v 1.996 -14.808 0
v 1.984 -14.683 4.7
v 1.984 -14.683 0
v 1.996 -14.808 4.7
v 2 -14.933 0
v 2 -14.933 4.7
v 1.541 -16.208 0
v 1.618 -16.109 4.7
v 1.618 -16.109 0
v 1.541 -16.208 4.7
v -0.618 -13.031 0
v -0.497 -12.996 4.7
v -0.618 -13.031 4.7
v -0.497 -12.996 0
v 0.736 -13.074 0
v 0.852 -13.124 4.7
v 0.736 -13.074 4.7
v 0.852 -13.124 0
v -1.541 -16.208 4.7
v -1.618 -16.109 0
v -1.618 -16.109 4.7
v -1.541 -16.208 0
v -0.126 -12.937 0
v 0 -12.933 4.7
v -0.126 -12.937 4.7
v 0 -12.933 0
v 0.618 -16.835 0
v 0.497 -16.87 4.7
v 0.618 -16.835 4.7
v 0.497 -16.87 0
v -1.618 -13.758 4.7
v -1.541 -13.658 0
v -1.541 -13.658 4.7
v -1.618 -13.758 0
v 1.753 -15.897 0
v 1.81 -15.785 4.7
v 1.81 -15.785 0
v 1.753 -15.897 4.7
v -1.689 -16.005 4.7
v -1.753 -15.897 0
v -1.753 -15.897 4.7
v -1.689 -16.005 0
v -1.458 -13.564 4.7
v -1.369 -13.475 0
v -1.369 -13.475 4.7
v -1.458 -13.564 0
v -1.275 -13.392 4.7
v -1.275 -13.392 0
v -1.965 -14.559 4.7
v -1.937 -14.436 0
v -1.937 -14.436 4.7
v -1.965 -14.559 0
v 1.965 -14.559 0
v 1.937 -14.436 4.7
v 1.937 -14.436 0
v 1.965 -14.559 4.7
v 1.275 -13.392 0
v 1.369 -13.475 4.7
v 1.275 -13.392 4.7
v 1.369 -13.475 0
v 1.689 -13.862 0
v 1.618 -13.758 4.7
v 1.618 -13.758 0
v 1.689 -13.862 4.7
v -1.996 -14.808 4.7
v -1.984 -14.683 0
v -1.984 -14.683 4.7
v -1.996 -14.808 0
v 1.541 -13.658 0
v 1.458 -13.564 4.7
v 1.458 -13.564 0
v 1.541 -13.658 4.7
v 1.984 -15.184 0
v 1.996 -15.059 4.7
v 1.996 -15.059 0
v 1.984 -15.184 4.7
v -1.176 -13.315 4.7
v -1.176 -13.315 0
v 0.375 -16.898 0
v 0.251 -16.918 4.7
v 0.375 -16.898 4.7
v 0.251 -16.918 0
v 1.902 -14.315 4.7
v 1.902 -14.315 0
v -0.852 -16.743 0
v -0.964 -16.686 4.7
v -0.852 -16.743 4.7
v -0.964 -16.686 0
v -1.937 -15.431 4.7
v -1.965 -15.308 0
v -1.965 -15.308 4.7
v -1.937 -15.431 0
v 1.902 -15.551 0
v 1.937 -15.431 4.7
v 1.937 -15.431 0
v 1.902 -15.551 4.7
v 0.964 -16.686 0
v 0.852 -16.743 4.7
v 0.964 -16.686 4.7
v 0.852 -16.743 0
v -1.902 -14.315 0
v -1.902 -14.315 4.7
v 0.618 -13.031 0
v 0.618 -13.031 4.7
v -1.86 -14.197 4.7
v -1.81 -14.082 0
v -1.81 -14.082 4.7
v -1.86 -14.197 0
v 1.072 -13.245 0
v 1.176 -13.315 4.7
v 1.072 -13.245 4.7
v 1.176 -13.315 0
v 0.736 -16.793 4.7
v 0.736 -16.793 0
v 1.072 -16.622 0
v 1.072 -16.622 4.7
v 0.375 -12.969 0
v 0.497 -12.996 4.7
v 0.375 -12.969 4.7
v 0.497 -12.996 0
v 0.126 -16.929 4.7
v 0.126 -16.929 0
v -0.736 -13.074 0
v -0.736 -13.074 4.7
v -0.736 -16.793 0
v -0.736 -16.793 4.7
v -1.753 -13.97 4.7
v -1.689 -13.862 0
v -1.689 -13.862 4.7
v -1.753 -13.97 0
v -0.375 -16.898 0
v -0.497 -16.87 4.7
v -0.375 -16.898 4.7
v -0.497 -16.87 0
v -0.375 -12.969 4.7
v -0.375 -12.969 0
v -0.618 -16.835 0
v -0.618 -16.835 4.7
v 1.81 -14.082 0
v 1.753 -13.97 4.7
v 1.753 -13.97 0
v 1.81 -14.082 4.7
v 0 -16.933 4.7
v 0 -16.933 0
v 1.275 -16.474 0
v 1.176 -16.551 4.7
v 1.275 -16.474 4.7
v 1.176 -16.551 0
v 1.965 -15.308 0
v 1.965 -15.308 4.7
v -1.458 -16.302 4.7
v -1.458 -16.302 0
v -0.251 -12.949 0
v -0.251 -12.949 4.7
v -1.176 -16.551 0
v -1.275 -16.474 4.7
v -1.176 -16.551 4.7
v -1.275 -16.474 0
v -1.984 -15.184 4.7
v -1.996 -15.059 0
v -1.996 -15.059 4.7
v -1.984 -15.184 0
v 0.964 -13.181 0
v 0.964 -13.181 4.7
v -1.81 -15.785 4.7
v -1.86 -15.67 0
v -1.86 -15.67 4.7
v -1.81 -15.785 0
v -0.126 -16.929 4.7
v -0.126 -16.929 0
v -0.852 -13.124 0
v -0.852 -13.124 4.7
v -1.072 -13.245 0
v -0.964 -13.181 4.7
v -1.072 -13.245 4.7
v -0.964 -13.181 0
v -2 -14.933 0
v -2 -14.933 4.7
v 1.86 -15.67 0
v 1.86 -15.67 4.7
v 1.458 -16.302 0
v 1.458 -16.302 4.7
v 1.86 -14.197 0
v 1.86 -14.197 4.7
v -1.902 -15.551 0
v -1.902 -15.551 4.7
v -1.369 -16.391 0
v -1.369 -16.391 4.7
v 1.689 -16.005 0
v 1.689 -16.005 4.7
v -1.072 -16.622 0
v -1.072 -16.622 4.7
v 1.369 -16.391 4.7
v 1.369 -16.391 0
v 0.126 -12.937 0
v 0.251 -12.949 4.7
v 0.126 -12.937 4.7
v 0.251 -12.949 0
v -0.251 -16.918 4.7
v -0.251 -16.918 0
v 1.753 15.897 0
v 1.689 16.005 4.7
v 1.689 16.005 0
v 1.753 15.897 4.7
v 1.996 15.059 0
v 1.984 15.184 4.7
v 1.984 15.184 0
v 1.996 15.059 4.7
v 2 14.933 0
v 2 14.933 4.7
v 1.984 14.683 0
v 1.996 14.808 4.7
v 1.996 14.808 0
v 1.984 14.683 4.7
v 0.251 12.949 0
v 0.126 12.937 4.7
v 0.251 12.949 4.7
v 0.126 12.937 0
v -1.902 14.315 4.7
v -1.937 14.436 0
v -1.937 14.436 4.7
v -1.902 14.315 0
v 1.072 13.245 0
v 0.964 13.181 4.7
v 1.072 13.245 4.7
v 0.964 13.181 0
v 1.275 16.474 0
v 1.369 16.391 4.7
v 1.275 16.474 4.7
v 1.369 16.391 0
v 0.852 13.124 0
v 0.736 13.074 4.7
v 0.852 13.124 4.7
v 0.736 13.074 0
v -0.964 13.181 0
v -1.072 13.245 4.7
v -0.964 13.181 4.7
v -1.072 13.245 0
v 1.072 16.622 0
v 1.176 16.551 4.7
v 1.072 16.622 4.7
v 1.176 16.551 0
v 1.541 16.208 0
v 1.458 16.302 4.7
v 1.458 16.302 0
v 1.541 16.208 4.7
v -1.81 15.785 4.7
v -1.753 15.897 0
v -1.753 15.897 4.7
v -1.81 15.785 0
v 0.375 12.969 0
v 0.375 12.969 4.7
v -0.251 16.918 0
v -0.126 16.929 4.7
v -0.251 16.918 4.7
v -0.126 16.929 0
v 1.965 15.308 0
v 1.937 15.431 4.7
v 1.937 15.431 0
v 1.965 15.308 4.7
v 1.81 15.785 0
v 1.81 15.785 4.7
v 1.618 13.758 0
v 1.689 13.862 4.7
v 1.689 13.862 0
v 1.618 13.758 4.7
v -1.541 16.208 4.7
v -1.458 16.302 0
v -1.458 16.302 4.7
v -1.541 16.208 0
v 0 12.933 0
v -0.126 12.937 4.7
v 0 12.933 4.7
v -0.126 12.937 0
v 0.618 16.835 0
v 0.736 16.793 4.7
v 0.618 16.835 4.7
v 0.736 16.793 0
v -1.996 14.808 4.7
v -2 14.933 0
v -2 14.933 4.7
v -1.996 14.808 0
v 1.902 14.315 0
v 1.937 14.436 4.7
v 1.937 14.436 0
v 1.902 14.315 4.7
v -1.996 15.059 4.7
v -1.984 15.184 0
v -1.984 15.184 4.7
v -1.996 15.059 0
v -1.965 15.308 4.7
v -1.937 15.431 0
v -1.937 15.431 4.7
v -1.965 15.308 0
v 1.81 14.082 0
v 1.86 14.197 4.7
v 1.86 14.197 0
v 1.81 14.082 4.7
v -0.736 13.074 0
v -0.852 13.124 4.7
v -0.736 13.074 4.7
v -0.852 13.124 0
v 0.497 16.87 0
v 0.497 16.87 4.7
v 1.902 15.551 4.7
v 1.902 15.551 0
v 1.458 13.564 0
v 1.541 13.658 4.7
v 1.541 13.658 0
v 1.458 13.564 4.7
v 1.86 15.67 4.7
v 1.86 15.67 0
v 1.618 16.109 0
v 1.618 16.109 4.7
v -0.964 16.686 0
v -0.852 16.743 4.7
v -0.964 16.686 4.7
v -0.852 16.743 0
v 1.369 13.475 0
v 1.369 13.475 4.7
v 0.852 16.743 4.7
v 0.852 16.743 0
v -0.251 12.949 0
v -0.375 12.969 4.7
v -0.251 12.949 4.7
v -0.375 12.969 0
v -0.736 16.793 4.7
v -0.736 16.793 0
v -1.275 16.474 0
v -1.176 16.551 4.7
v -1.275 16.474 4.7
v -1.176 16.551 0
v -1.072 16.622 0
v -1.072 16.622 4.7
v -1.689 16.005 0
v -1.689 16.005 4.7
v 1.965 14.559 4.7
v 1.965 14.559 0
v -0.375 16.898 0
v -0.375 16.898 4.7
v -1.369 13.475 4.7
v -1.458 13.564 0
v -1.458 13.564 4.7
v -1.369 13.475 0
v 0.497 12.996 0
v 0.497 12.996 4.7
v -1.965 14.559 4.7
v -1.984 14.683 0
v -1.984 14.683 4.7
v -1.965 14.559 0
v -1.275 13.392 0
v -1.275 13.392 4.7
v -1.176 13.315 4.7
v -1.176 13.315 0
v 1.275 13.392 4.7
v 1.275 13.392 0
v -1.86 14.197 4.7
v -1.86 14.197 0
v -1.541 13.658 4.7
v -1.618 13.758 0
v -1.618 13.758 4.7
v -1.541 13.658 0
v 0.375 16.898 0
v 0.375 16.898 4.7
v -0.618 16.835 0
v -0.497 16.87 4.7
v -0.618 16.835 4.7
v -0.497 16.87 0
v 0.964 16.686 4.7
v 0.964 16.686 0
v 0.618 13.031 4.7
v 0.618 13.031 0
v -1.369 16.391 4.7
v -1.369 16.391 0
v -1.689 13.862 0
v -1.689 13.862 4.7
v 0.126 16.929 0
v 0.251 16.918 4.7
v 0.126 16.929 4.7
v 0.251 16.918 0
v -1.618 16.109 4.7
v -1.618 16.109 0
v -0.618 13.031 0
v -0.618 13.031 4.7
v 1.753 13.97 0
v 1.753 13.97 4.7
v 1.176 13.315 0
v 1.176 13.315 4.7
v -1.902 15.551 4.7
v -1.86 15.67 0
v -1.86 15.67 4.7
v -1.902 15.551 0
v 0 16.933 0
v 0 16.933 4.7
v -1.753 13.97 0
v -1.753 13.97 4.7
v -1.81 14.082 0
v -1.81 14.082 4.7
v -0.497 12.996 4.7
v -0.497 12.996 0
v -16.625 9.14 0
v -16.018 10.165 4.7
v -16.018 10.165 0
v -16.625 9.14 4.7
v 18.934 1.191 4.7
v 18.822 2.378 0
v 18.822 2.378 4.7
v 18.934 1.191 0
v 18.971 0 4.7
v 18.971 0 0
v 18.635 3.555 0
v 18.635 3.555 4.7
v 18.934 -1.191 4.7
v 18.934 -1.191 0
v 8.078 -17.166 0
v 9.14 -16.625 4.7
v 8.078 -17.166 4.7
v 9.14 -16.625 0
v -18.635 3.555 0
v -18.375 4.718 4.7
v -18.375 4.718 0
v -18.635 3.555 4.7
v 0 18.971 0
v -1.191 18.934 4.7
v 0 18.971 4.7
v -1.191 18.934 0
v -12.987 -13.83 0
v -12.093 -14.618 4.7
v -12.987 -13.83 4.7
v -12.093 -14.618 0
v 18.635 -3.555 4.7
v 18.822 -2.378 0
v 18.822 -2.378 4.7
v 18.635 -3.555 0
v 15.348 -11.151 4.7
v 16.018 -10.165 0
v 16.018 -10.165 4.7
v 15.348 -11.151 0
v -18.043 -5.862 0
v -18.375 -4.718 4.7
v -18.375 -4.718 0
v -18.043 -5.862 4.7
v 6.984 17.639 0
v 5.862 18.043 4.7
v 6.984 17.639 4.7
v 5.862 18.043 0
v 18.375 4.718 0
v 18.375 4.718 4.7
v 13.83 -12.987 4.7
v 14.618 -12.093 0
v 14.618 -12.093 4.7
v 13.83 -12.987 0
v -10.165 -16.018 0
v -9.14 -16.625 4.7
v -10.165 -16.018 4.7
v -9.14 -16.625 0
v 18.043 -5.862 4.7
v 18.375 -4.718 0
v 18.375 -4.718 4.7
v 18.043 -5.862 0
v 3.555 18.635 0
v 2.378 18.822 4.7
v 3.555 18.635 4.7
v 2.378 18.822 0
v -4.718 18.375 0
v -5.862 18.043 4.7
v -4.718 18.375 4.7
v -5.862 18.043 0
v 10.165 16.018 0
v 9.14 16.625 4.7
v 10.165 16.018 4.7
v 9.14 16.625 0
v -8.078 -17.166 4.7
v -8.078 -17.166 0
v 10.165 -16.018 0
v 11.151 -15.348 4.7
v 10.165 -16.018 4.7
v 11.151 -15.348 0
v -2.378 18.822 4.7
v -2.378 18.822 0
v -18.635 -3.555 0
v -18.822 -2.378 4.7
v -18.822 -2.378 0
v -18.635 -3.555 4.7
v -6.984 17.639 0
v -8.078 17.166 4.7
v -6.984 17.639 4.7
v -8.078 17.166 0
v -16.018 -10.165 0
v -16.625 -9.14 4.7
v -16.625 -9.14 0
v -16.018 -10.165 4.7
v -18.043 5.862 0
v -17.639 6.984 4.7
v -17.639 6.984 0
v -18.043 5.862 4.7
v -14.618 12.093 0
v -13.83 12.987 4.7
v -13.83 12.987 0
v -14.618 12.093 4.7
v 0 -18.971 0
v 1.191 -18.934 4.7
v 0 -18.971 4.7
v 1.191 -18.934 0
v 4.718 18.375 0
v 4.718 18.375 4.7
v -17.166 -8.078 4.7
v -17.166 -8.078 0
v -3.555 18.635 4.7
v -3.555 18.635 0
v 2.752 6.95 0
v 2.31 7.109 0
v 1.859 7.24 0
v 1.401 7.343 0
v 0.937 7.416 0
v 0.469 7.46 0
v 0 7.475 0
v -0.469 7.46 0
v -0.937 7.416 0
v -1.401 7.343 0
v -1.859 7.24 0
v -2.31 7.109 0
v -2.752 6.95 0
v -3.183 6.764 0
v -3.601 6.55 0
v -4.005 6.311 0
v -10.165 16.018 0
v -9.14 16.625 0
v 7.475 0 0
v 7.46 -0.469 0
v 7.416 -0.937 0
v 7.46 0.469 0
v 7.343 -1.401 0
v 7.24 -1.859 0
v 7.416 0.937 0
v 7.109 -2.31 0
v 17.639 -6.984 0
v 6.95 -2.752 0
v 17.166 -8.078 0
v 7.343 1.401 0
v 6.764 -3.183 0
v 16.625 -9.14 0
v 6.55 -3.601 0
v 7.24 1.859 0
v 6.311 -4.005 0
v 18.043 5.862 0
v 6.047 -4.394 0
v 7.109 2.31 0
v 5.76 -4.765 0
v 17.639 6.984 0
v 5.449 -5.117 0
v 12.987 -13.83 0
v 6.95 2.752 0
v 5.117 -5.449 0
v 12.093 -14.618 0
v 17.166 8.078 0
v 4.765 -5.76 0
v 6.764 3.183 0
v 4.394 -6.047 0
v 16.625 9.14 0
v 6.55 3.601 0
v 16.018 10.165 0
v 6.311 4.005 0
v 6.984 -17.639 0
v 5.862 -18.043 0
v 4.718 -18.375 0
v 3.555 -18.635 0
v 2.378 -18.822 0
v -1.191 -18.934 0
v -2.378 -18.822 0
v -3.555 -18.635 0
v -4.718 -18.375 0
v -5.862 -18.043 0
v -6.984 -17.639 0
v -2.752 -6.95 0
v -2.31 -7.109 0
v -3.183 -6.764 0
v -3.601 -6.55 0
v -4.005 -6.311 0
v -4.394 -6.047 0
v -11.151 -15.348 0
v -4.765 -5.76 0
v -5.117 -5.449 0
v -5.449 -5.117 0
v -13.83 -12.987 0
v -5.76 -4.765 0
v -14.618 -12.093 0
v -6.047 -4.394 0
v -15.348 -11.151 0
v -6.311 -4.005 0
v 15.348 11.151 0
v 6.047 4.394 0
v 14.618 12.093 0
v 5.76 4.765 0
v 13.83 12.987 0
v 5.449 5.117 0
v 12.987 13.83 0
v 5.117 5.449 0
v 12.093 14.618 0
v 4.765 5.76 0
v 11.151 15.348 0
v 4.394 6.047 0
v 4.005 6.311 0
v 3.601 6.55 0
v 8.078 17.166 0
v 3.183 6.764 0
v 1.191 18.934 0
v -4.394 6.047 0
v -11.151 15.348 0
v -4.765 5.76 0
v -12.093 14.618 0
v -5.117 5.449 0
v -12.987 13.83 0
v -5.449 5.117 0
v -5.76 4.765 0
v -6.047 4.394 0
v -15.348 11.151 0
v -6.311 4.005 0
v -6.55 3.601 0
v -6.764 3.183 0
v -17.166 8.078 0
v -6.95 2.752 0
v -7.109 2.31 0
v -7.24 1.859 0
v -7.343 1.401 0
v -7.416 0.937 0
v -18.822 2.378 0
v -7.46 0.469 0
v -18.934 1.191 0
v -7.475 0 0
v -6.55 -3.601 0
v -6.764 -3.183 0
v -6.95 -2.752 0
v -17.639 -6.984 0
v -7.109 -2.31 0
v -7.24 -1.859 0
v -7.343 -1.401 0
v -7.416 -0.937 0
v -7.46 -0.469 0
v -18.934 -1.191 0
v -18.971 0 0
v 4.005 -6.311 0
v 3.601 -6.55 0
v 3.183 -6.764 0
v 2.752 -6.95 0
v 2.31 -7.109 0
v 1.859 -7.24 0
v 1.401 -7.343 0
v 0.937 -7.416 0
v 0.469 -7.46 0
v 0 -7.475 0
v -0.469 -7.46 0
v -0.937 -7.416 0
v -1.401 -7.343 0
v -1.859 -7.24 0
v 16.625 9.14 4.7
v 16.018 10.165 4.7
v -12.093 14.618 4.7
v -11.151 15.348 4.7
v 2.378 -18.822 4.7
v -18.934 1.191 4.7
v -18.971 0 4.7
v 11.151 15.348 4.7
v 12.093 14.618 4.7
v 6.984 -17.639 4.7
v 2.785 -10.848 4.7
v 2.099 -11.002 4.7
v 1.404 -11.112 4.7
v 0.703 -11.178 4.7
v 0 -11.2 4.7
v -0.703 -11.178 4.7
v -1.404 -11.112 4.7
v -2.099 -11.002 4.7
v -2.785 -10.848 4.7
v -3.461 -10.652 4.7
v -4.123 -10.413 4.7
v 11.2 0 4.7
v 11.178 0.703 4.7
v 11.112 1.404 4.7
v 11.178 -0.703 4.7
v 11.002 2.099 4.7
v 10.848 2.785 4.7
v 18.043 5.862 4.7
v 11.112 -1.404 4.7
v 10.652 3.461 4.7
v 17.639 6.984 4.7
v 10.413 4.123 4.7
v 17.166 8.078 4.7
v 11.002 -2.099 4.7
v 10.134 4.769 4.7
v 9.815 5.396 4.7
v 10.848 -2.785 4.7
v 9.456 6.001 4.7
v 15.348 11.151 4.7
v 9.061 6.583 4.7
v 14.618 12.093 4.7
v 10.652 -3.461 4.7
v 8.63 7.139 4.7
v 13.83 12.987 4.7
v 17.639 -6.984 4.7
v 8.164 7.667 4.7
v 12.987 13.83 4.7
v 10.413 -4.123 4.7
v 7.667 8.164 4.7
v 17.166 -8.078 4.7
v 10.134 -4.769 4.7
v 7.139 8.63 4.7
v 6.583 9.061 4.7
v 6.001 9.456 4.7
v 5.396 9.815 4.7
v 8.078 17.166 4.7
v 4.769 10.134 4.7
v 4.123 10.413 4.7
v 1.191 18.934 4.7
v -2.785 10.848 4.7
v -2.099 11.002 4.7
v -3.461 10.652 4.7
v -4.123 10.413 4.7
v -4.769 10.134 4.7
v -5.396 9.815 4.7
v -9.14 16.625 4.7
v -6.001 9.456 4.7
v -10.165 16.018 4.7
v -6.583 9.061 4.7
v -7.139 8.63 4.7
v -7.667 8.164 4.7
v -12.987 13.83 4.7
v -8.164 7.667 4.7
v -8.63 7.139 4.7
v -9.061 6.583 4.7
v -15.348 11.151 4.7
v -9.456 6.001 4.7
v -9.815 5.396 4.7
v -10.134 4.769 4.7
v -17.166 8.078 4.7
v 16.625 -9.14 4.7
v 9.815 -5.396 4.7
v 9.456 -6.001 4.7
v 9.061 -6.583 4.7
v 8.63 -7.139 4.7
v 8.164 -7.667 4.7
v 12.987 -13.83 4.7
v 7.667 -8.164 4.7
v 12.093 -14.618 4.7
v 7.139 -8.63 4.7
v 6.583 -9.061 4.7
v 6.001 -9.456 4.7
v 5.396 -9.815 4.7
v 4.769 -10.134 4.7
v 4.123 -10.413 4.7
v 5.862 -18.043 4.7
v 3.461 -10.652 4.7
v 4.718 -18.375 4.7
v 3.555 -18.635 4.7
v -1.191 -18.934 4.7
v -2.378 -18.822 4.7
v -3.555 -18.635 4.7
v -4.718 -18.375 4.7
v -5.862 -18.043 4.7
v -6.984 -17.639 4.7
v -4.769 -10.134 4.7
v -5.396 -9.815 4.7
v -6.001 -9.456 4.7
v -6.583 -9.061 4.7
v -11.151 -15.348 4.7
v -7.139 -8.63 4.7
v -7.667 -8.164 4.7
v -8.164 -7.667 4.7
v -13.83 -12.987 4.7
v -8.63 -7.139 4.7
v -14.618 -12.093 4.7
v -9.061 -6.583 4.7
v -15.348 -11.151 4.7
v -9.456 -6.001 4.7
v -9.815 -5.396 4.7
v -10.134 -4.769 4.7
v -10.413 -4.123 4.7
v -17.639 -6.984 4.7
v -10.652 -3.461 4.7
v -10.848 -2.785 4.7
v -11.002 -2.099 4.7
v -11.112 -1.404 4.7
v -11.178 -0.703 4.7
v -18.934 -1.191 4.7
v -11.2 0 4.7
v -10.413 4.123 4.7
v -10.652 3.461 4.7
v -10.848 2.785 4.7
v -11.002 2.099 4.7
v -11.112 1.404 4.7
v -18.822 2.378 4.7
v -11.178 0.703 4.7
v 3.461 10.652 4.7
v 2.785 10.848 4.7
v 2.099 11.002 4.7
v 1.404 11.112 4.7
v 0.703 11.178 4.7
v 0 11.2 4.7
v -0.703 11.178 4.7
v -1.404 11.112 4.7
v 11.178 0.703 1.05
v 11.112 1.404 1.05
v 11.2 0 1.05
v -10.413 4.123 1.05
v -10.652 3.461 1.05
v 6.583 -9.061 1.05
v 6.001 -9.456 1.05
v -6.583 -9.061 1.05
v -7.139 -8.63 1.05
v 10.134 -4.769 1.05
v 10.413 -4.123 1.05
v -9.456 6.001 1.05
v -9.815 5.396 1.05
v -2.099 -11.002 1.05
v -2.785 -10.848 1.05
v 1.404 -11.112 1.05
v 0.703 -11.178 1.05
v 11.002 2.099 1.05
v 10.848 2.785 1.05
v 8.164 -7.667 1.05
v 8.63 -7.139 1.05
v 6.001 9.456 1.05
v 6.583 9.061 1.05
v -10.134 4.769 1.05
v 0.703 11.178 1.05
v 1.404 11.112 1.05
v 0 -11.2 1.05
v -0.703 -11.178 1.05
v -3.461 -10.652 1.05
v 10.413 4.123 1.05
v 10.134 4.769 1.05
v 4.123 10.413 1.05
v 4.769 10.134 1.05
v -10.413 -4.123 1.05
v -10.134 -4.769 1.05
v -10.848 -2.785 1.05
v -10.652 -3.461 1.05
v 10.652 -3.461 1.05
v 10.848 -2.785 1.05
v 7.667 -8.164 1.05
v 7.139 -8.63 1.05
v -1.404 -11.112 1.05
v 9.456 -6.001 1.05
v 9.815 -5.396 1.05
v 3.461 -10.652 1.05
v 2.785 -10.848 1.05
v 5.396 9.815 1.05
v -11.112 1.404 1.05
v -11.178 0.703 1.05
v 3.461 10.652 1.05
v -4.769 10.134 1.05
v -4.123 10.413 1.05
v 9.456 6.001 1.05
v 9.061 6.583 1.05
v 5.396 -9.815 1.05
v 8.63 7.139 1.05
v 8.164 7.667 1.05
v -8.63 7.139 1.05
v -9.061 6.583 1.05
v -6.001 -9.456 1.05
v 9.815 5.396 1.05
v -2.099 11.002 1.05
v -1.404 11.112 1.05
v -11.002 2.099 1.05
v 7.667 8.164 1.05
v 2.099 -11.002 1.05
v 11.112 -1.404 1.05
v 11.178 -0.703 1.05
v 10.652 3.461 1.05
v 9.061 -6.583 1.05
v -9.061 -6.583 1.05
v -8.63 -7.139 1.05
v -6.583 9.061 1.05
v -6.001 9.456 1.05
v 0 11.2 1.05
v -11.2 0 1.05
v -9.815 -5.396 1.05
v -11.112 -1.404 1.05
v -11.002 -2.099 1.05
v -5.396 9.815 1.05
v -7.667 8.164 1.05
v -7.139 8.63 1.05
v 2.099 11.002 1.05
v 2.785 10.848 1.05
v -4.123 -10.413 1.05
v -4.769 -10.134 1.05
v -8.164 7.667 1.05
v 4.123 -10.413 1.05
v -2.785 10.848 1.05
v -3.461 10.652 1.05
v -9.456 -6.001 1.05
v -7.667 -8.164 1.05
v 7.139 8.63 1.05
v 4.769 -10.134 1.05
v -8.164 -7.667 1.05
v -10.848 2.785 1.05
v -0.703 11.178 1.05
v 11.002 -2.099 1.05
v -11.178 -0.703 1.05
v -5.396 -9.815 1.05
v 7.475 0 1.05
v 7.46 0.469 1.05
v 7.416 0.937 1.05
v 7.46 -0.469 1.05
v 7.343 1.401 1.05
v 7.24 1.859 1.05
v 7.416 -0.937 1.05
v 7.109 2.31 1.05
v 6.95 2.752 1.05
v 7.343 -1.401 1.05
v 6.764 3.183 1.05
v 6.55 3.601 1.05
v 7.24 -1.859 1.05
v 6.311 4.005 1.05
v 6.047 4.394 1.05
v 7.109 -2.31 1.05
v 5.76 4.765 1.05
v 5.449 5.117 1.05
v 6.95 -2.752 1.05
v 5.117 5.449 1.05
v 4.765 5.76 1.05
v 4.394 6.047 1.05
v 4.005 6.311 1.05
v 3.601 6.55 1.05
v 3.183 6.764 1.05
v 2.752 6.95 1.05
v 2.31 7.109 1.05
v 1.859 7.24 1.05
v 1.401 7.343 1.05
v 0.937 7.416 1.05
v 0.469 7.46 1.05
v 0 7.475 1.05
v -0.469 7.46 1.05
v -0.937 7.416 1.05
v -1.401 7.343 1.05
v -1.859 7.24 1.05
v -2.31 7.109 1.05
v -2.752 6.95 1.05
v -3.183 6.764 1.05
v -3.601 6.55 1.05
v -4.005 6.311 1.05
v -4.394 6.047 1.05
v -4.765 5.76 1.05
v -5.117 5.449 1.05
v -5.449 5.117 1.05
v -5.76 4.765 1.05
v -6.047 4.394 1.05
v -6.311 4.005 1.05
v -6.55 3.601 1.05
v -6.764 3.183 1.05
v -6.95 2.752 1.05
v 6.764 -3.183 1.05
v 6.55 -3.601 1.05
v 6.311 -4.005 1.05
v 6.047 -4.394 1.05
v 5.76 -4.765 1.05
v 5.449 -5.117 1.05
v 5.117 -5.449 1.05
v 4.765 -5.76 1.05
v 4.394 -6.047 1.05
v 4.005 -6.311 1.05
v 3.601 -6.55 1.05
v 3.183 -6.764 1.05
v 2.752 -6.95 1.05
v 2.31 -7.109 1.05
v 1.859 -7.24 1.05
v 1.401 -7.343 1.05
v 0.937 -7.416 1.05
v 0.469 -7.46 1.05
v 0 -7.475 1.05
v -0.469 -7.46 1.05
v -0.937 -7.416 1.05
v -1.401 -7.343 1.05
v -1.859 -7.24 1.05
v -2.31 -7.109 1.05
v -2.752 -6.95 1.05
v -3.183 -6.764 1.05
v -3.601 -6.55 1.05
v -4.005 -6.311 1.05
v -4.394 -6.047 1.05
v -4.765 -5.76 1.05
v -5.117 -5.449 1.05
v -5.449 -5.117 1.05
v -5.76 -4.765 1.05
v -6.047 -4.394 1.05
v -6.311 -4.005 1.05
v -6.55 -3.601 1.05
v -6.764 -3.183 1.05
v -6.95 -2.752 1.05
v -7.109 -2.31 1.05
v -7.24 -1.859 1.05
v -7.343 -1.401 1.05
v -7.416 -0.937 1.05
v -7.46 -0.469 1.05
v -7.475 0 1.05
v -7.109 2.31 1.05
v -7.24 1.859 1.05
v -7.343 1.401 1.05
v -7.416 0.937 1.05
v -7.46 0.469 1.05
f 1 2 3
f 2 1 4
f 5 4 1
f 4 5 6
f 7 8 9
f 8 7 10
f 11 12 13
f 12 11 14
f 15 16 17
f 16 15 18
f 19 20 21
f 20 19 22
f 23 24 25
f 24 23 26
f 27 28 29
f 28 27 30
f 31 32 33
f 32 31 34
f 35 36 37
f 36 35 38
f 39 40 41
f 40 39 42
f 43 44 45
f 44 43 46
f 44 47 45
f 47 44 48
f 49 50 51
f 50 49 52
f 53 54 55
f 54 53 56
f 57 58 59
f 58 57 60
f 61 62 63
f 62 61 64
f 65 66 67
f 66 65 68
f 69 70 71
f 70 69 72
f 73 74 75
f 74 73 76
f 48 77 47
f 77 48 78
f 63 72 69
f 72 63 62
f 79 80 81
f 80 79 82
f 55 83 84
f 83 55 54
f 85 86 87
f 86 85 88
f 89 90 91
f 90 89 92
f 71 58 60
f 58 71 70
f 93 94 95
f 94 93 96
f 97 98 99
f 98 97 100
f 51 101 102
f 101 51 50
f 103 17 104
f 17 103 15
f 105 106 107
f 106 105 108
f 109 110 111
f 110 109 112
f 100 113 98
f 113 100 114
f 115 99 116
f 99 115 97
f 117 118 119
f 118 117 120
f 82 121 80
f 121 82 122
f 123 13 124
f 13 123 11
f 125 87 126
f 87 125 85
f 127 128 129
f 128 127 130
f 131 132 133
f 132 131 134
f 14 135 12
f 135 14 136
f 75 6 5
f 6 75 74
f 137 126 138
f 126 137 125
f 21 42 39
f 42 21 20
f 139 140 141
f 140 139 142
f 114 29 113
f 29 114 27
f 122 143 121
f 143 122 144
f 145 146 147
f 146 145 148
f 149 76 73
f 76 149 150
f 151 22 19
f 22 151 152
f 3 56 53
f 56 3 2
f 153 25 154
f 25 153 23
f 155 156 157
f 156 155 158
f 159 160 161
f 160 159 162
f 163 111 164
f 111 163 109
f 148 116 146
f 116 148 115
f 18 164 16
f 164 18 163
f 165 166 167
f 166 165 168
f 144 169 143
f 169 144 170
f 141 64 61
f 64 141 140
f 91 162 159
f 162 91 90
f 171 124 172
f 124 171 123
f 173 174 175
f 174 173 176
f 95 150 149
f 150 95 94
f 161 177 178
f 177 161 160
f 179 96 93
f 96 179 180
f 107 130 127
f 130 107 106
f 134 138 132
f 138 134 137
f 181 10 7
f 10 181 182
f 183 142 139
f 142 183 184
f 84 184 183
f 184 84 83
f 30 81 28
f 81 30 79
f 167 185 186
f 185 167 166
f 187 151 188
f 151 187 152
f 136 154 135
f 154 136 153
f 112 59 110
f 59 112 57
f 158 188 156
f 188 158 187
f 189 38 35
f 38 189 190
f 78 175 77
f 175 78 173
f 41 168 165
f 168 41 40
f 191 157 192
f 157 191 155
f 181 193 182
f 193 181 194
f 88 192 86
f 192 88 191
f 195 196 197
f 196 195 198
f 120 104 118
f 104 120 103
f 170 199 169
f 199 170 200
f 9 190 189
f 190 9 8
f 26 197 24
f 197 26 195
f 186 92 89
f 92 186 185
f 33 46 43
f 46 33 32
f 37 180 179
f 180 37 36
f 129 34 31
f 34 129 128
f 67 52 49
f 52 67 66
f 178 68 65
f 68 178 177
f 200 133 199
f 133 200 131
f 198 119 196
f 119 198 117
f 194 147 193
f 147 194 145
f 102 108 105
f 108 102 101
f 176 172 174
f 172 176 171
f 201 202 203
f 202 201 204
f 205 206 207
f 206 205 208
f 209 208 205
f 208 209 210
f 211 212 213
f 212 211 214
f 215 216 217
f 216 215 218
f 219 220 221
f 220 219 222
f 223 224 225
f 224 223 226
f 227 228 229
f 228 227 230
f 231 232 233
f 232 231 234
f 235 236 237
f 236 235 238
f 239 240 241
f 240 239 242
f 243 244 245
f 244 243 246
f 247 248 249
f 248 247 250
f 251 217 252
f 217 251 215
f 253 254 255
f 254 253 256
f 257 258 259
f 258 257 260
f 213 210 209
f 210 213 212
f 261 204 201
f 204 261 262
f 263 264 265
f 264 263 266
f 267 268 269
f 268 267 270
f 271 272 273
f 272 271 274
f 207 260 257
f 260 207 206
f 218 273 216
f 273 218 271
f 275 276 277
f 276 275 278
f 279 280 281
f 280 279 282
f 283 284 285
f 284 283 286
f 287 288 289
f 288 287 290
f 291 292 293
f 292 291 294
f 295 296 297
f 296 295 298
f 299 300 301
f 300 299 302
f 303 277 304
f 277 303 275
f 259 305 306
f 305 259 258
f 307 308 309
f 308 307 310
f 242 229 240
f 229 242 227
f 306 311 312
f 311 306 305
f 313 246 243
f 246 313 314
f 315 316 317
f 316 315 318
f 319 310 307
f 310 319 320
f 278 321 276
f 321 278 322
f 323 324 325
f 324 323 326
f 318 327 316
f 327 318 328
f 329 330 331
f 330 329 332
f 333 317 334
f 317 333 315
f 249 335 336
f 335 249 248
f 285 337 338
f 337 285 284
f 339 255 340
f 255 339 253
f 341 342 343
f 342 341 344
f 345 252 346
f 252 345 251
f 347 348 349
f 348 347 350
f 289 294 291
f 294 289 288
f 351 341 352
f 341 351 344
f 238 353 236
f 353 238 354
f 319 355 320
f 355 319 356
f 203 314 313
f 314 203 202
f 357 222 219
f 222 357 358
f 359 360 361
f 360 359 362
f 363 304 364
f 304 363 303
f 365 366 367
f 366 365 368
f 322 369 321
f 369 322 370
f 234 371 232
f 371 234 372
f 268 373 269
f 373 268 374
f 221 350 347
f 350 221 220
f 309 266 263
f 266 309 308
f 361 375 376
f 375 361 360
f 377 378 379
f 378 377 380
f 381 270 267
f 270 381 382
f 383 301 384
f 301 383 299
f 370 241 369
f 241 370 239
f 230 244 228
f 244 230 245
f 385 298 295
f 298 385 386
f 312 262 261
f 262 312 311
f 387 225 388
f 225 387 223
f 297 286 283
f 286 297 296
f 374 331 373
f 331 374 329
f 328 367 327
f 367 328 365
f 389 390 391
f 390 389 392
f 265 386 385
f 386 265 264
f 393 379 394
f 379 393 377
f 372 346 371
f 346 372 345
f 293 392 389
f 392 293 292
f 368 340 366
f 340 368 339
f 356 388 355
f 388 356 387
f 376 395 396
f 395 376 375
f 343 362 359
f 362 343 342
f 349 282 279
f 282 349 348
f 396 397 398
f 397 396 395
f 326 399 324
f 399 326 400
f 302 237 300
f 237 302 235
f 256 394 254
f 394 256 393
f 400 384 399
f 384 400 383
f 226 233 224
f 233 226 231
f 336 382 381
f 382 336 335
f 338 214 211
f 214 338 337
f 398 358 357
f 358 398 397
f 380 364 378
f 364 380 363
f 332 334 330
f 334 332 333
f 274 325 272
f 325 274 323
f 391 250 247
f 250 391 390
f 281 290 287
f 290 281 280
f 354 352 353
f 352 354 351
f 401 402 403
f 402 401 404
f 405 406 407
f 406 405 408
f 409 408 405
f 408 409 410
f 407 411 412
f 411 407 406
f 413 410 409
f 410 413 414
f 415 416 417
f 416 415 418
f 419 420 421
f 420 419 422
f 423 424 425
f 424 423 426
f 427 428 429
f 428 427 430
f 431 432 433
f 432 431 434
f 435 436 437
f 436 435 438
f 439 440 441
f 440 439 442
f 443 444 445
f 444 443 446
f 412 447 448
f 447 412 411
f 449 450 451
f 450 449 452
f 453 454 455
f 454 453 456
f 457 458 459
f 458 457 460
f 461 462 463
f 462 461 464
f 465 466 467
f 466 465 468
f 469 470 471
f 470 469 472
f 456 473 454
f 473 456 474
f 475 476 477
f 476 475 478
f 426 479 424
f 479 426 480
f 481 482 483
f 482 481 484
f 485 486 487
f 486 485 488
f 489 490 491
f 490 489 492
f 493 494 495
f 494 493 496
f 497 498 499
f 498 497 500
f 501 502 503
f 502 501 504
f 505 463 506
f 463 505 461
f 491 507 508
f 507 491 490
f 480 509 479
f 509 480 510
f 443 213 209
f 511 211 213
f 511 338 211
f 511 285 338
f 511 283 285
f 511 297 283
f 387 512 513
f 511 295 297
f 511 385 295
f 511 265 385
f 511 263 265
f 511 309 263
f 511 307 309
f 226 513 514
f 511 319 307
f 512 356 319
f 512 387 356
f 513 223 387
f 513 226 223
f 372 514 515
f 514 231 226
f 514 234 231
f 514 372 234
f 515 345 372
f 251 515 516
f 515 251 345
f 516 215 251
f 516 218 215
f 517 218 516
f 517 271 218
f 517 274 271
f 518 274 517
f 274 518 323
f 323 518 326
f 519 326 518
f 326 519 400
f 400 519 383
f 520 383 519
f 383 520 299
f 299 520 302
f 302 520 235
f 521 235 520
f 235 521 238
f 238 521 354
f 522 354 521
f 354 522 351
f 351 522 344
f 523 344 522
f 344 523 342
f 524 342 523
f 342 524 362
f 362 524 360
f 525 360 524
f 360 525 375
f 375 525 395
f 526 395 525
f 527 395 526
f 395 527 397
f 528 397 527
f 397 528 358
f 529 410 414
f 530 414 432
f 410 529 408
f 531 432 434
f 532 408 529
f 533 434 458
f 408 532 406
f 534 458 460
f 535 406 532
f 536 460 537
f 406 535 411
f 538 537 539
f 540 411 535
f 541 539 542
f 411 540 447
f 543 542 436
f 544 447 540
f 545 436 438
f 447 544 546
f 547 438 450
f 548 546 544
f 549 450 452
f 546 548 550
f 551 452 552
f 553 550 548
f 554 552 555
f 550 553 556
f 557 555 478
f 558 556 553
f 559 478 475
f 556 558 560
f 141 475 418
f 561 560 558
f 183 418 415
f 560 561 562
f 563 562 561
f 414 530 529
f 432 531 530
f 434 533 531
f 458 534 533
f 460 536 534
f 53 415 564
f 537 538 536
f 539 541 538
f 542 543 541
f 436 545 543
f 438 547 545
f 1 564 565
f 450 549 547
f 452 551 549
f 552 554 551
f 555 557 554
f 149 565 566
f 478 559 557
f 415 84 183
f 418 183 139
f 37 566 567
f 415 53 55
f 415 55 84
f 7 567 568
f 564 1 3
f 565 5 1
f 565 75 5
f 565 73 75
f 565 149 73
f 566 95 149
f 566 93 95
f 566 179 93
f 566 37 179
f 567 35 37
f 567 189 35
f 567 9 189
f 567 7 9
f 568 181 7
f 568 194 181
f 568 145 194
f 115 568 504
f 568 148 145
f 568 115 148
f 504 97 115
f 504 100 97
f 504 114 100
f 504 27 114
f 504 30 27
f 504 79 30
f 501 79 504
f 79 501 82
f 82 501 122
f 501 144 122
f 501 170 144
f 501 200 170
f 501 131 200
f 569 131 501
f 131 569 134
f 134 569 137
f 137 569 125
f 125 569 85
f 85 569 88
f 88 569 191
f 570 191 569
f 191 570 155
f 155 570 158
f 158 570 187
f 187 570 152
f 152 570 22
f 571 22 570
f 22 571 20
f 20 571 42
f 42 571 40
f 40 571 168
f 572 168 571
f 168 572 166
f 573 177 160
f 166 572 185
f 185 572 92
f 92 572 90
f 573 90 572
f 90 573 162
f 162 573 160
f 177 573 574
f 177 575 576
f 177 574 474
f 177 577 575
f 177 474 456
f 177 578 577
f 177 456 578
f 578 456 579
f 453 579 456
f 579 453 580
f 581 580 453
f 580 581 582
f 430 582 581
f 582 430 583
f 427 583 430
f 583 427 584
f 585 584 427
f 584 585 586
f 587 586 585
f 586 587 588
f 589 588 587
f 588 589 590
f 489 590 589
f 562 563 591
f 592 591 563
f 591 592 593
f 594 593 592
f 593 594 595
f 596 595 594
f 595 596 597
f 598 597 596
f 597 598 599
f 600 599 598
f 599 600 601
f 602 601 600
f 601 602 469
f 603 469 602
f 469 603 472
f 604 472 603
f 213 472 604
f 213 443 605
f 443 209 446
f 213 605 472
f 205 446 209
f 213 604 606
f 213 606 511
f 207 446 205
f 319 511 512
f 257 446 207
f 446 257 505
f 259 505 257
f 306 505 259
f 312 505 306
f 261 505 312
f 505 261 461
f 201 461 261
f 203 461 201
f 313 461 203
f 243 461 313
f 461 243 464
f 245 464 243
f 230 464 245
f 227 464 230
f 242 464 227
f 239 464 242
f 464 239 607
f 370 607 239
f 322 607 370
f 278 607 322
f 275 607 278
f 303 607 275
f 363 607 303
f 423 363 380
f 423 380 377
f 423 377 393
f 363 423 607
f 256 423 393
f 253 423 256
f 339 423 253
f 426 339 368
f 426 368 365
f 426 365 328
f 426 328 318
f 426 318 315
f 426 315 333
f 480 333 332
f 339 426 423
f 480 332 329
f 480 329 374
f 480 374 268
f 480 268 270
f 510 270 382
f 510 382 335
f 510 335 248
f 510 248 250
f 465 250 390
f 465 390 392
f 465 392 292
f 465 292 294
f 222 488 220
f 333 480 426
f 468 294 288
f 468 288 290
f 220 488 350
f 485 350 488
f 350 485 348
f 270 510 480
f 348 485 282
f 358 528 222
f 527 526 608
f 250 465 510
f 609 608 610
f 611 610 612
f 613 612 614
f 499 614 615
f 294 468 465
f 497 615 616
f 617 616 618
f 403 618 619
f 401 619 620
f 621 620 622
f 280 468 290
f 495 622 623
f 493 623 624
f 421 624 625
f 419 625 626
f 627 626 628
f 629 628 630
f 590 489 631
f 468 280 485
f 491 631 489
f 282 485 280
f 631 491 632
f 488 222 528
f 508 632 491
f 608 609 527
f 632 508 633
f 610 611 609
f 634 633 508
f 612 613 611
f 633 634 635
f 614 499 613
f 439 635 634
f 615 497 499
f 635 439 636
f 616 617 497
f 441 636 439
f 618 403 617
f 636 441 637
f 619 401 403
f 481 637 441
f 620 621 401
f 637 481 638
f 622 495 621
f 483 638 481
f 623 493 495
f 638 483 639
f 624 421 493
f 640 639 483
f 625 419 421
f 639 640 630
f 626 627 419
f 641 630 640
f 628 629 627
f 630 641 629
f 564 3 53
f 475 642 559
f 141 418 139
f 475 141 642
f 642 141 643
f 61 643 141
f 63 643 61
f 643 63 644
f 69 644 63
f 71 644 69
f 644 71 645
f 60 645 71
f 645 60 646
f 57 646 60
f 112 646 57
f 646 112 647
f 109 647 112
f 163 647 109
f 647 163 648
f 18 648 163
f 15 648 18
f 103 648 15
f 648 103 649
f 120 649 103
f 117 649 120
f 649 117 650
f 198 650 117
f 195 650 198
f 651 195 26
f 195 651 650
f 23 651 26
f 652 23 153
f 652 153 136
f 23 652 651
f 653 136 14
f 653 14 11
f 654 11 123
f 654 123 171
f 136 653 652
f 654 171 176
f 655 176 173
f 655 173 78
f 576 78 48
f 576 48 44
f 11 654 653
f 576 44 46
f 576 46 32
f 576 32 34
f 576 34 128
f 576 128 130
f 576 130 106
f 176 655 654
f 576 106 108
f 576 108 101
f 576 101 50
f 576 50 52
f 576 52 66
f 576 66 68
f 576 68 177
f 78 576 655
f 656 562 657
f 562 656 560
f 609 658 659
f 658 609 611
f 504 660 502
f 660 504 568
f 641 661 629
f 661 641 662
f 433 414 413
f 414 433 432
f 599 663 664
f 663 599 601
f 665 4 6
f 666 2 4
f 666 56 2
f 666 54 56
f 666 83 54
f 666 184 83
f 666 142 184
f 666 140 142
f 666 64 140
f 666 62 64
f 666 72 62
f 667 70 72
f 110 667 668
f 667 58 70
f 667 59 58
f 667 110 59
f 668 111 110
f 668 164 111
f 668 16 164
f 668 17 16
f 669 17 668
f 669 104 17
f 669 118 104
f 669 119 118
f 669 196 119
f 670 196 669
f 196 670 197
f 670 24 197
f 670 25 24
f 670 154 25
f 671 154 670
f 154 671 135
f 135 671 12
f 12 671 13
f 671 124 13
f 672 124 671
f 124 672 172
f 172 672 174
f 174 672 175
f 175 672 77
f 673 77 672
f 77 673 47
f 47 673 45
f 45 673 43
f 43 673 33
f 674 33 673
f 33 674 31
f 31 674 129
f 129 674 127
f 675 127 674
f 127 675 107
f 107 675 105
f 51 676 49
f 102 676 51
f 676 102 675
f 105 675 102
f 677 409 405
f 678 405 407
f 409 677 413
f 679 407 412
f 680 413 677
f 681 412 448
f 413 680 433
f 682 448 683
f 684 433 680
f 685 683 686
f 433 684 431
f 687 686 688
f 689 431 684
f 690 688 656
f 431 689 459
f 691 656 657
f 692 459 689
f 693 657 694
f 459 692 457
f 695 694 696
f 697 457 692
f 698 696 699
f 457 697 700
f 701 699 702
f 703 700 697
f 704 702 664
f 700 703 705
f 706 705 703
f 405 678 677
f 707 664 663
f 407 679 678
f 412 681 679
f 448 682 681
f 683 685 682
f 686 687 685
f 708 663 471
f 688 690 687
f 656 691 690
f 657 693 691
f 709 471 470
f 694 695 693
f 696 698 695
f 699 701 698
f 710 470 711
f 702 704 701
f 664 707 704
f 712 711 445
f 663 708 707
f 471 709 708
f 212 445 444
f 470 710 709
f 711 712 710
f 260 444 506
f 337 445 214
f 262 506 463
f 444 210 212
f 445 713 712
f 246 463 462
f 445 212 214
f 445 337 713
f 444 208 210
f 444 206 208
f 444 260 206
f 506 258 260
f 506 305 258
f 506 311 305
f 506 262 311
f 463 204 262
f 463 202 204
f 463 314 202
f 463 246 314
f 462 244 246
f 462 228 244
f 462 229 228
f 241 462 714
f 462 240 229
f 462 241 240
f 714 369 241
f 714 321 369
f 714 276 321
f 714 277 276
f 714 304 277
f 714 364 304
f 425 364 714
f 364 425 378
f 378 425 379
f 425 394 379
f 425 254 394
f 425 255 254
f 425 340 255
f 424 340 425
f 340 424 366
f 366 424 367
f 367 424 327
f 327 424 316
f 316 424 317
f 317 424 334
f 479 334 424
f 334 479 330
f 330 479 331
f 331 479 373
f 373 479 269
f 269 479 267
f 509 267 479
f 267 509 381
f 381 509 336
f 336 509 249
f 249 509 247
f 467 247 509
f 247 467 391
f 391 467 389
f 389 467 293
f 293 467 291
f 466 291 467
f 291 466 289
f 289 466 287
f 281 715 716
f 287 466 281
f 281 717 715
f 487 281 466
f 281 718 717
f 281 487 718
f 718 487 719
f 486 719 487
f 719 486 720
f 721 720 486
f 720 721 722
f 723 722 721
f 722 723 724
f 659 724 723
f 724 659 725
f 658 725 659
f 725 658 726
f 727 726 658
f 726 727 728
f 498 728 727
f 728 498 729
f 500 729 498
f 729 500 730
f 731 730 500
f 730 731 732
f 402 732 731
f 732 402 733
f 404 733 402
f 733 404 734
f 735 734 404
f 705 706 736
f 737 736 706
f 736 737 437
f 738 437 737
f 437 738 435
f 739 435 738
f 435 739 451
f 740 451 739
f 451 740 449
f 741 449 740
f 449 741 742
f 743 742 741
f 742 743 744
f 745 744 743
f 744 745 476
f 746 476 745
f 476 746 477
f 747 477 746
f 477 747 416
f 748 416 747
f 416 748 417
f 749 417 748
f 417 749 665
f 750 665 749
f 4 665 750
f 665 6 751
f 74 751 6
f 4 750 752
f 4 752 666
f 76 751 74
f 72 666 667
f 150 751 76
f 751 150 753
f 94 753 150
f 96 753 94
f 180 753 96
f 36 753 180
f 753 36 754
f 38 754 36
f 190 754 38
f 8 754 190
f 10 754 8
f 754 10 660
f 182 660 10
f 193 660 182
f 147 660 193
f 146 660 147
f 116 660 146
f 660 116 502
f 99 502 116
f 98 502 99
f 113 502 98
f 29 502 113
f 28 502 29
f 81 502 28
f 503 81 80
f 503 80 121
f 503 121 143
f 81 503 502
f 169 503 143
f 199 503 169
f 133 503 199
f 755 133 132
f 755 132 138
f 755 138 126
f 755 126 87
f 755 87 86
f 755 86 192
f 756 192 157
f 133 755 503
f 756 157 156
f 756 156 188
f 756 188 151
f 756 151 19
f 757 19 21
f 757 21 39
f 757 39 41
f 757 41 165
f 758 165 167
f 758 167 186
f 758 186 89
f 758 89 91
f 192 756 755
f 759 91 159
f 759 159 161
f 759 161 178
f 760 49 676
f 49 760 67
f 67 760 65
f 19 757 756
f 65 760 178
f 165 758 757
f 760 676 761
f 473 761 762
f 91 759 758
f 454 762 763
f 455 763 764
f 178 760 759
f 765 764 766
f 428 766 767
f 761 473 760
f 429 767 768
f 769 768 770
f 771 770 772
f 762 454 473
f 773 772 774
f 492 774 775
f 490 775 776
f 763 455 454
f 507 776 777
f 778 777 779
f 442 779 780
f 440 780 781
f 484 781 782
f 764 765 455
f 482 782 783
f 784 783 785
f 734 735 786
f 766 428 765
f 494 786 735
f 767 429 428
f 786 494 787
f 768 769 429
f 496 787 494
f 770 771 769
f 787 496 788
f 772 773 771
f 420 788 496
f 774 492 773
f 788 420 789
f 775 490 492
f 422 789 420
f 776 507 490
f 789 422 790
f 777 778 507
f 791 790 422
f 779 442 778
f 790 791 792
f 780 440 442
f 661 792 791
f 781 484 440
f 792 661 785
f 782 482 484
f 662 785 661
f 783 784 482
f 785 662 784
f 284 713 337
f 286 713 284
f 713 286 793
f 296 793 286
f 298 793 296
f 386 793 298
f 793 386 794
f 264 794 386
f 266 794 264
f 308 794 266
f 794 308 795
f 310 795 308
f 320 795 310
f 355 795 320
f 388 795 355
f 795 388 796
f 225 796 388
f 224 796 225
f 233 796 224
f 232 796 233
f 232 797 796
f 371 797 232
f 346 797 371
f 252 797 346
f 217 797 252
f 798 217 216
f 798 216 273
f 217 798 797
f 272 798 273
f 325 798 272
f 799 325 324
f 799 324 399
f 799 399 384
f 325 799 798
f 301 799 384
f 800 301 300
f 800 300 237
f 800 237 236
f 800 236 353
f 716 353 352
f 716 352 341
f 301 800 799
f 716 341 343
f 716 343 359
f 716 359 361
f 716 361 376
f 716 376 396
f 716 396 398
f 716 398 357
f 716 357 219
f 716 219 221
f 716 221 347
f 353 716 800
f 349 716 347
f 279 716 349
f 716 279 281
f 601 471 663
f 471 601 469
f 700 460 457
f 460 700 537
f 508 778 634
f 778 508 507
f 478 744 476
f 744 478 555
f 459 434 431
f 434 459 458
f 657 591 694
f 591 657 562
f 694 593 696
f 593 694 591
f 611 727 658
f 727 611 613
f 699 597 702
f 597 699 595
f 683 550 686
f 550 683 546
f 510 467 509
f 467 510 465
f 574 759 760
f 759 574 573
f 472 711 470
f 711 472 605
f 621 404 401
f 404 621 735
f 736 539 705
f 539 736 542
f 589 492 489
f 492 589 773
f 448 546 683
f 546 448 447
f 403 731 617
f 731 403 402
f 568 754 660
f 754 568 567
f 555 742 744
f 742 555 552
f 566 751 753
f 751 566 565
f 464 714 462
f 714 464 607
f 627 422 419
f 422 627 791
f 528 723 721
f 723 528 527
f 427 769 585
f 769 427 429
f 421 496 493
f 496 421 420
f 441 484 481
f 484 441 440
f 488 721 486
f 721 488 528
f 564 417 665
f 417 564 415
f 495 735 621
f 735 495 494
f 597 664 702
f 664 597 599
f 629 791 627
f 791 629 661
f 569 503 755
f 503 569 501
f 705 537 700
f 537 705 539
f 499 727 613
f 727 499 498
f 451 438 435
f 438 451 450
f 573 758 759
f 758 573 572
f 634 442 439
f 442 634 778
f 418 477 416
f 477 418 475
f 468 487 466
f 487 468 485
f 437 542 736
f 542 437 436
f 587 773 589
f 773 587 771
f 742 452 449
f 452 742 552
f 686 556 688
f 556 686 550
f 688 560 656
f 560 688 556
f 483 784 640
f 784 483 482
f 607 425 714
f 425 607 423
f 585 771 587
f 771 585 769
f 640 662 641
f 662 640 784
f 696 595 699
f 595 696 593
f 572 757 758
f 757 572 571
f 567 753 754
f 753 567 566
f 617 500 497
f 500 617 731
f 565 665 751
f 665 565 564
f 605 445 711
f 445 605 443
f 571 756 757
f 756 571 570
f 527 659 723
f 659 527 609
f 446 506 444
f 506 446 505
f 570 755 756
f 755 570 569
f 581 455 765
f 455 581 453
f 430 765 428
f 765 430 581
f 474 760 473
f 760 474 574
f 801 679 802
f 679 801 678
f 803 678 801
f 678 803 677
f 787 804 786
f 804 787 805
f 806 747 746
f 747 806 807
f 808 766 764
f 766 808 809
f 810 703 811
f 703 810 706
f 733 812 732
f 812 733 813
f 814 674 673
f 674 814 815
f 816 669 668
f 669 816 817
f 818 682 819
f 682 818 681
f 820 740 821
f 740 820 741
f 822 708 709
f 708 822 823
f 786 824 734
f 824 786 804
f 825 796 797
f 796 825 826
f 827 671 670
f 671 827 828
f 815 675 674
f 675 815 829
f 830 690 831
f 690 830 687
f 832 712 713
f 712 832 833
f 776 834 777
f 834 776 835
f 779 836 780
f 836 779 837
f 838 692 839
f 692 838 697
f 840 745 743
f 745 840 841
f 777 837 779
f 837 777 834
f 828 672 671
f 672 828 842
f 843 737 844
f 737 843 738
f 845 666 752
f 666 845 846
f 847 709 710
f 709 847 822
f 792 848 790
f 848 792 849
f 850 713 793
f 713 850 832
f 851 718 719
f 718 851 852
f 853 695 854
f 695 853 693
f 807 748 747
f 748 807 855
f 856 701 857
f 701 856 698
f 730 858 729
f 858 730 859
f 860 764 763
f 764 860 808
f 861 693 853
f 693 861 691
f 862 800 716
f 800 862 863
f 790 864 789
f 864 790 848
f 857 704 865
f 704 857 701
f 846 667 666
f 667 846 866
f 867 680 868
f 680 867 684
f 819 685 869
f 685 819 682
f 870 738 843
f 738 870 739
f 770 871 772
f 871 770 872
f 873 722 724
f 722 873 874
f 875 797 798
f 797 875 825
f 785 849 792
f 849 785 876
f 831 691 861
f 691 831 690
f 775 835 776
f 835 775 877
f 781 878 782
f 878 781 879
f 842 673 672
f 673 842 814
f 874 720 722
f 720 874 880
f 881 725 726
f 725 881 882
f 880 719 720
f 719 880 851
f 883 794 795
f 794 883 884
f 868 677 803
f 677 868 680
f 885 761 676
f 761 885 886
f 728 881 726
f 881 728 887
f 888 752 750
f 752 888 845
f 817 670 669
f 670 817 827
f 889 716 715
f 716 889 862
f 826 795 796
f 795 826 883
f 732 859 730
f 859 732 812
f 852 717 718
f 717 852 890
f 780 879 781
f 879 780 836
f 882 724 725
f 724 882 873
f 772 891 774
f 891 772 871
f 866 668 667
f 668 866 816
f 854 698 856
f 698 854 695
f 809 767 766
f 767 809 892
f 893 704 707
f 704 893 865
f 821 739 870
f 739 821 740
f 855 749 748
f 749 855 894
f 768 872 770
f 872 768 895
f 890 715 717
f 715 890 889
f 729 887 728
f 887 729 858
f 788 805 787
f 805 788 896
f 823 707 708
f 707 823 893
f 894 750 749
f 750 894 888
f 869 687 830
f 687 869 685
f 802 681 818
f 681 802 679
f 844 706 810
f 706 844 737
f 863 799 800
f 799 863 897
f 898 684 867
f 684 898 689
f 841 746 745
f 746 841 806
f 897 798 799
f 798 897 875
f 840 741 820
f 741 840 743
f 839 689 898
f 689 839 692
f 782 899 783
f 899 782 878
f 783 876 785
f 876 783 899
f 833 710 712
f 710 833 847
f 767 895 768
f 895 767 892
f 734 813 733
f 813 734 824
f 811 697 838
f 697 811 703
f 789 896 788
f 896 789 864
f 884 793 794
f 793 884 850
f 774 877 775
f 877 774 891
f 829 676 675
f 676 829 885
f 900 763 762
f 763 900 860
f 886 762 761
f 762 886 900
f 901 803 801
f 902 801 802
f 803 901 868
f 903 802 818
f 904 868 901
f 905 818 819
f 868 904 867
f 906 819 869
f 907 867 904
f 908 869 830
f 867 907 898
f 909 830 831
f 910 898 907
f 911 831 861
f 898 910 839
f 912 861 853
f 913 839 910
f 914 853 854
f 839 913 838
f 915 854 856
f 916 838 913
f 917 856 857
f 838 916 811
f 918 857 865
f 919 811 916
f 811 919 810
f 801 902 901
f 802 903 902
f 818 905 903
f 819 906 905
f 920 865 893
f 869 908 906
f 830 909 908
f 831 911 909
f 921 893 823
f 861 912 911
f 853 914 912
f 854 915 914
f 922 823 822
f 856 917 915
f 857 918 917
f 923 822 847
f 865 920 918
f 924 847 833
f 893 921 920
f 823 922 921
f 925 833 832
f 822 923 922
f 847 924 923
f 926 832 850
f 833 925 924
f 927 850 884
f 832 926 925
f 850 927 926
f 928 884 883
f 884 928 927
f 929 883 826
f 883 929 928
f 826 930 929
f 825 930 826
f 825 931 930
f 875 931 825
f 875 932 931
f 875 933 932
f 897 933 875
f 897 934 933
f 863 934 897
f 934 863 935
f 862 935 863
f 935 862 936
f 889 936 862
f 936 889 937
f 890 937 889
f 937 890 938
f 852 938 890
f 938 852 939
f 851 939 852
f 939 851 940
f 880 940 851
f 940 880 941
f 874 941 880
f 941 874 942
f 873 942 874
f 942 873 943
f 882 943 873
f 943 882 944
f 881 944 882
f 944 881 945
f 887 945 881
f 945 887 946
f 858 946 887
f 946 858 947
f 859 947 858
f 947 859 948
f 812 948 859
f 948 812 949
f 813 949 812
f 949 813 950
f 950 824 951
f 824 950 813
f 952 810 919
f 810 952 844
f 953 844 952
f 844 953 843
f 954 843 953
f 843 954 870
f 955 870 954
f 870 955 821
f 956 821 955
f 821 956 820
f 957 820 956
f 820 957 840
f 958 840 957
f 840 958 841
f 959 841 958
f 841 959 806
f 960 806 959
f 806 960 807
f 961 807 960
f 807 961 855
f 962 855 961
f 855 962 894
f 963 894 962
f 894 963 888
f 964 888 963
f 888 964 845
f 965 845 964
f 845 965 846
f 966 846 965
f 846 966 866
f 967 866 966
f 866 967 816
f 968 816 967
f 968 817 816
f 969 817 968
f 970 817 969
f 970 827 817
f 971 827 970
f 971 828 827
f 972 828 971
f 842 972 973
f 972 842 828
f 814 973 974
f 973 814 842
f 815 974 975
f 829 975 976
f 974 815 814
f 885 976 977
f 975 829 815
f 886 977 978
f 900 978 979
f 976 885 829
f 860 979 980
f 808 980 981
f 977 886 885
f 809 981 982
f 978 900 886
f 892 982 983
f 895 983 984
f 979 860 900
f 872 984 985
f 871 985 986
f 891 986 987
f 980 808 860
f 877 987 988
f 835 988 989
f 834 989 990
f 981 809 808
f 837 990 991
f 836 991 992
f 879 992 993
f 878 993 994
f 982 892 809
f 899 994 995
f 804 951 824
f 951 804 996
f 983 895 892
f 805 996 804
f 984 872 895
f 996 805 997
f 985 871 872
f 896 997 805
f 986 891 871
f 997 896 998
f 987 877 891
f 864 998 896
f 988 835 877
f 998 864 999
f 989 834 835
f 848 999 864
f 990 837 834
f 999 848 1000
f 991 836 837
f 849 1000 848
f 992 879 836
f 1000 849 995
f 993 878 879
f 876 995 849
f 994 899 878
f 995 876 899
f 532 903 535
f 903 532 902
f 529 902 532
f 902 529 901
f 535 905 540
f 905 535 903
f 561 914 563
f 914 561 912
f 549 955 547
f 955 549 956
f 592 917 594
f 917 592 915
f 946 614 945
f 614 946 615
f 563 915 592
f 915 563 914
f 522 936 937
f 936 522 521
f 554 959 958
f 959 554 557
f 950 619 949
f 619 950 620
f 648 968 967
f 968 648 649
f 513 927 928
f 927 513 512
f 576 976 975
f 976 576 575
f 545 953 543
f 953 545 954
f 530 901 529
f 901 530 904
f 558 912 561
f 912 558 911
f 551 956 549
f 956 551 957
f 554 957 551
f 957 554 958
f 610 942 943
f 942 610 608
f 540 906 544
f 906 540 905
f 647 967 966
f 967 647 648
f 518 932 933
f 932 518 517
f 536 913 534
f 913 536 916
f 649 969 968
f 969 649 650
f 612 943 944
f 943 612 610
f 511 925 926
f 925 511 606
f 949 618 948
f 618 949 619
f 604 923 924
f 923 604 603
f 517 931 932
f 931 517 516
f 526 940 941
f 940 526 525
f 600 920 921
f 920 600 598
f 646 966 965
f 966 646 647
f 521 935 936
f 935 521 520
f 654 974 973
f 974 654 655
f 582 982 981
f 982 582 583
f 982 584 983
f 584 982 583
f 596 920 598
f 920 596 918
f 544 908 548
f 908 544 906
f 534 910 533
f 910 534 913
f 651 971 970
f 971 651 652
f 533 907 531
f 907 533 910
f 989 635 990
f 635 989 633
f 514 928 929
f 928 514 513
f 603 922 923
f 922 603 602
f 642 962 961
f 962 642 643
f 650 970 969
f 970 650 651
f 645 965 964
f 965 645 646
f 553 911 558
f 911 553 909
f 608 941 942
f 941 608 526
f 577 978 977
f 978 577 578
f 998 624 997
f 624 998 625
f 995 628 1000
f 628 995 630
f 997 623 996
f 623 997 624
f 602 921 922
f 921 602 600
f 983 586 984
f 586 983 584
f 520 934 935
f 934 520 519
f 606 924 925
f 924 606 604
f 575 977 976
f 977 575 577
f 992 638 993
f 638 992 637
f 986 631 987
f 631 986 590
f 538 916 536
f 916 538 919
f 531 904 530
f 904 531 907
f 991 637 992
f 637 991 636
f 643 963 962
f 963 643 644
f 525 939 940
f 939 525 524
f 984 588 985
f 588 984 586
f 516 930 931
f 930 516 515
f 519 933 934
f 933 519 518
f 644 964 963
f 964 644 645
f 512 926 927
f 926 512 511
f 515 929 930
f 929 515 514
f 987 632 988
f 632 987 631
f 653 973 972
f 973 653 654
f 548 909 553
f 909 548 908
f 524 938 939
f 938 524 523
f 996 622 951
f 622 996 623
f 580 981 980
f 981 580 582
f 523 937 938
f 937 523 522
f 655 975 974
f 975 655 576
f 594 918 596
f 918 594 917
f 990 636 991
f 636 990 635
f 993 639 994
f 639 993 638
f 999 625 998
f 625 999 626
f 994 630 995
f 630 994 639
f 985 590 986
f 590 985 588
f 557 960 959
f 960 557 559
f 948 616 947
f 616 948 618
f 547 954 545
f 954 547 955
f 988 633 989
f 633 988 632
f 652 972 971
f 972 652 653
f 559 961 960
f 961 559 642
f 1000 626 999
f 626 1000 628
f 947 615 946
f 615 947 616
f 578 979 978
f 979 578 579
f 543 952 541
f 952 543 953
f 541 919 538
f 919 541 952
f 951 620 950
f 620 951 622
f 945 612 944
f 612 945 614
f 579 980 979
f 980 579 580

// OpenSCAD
// file: Vitamins/LinearBearing.scad
use <../Tolerance.scad>

function LinearBearingDiam() = 15 + 3dPrinterTolerance();
function LinearBearingInnerDiam() = 8.3 + 3dPrinterTolerance();
function LinearBearingHeight() = 24 + 3dPrinterTolerance();

module LinearBearing()
{
cylinder(LinearBearingHeight(), LinearBearingDiam()/2, LinearBearingDiam()/2, 0);
}


LinearBearing();
// file: Vitamins/Zrod.scad
use <../Tolerance.scad>

function ZrodLength()=1000;
function ZrodDiameter()=8 + 3dPrinterTolerance();  //base case: 8
function ZrodRadius()=ZrodDiameter()/2;

module Zrod()
{
color("Silver")
cylinder(ZrodLength(), ZrodRadius(), ZrodRadius());
}

Zrod();
// file: KnuckleCapTop.scad
use <Knuckle2.scad>
use <Parameters.scad>
use <Tolerance.scad>
use <Vitamins/BallBearing.scad>
use <Vitamins/PlasticScrew.scad>

$fn=100;

function cupOD()=BallBearingDiam()/1.25+ScrewDiameter()/2;

holeinset1=[0,-BallBearingDiam()/1.5,-ScrewLength()+4];
holeinset2=[0,BallBearingDiam()/1.5,-ScrewLength()+4];

module Base(){
	
	difference(){
		cylinder(BallBearingInnerDiam()/4,cupOD()/1.05,cupOD()/1.05);
		translate([0,0,-BallBearingInnerDiam()/4]){
			cylinder(BallBearingInnerDiam()/4+4,(BallBearingInnerDiam()+BallBearingDiam())/4,(BallBearingInnerDiam()+BallBearingDiam())/4);
		}
	}
}

module CapTop(print=true){
	
	if(print==true){
		difference(){
			Base();

			translate(holeinset1){
				hole();
			}
	
			translate(holeinset2){
				hole();
			}
		}
	}else{
		union(){
			Base();
			translate(holeinset1){
				hole();
			}
			translate(holeinset2){
				hole();
			}
		}
	}
}
CapTop(true);
// file: Vitamins/PlasticScrew.scad
use <../Tolerance.scad>

function ScrewDiameter()= 3.6 + 3dPrinterTolerance();  
function ScrewLength()= 22 + 3dPrinterTolerance();
function ScrewHeadDiameter()= 6.7 + 3dPrinterTolerance();
function ScrewHeadHeight()= 2.5 + 3dPrinterTolerance();

//err on the side of smaller tolerances for screws

module screw()
{
	union()
	{
		translate([0,0,-ScrewLength()])
		{
			cylinder(ScrewLength(), ScrewDiameter()/2,ScrewDiameter()/2);
		}
		cylinder(ScrewHeadHeight(), ScrewHeadDiameter()/2,ScrewHeadDiameter()/2);
	}
}

screw();
// file: Vitamins/BallBearing.scad
use <../Tolerance.scad>

function BallBearingDiam() = 22 + 3dPrinterTolerance(); //USUALLY 22
function BallBearingHeight() = 7 + 3dPrinterTolerance(); //USUALLY 7
function BallBearingInnerDiam()= 7.9 - 3dPrinterTolerance(); //USUALLY 7.9

module BallBearing()
{
cylinder(BallBearingHeight(), BallBearingDiam()/2, BallBearingDiam()/2);
}


BallBearing();
// file: Knuckle2.scad
use <Parameters.scad>
use <Tolerance.scad>
use <Vitamins/BallBearing.scad>
use <Vitamins/PlasticScrew.scad>
use <KnuckleCapTop.scad>

$fn=100;

height=ZrodSpacing()+BallBearingDiam()/2;
Bdiam=BallBearingDiam();

function cupOD()= Bdiam/1.25+ScrewDiameter()/2;

module hole(){

	cylinder(ScrewLength(),ScrewDiameter()/2,ScrewDiameter()/2);
}

module BearingRecess(){

	difference(){
		cylinder(BallBearingInnerDiam()/2,cupOD()/1.05,cupOD()/1.05); 
		translate([0,0,-BallBearingHeight()/2]){
			cylinder(BallBearingHeight()*2,(Bdiam/2),(Bdiam/2));
		}
	}
}


module KnuckleShaft(){
	
	difference()	{	
		translate([0,height/2-2,0]){
			rotate([90,0,0]){
				cylinder(height,BallBearingInnerDiam()/2,BallBearingInnerDiam()/2);
			}
		}
		translate([-height/2,-height/2-4,-height]){
			cube([height,height+4,height]);
		}
		translate	([0,-height/4,-Bdiam/4]){
			hole();
		}
		translate([0,height/4,-Bdiam/4]){
			hole();
		}
	}
}
//this is the assembly of the two modules

module Knuckle(){
	
	difference(){	
		union(){
			KnuckleShaft();
			translate([0,-height/2-Bdiam/2-BallBearingInnerDiam()/2,0]){
				BearingRecess();
			}
		}
		translate([0,-height/2-Bdiam/2-BallBearingInnerDiam()/2,BallBearingInnerDiam()/2+1]){
			CapTop(false);
		}		
	}
}
Knuckle();
// file: Tolerance.scad
function LaserCutTolerance() = .02;
function 3dPrinterTolerance() = .4;
// file: Parameters.scad
use<Vitamins/Zrod.scad>
use<Vitamins/LinearBearing.scad>

function mm(i) = i*25.4; 

//Build dimensions (x,y,z)-- x, y and z of printable area, NOT of overall device

//z-rod length, diameter-- dependent on which rods you buy
//(bearing diameter is dependent on rod diameter)


function ZBearingSpacing()= 105;
function ZrodSpacing()=ZBearingSpacing()-LinearBearingDiam()*2-PlasticWidth()*4;
//echo(ZrodSpacing());

//parametric of which hotend is being used (printerbot or bucha nozzle)

//stepper vs servo

//3 parameters (1 for each link) horizontal vs vertical

//paper is a parametric vitamin

//distance between link arms will be calculable based on radius of toolplate




//tolerances
//function LaserCutTolerance() = .02;
//function 3dPrinterTolerance() = .4;



//the equation used for plastic width, it can of course be changed
function PlasticWidth()= (ZrodDiameter()/2);
function SideWidth() = (ZrodDiameter()+PlasticWidth());
// main file
use<Parameters.scad>
use<Tolerance.scad>
use<Knuckle2.scad>
use<Vitamins/BallBearing.scad>
use<Vitamins/PlasticScrew.scad>
use<KnuckleCapTop.scad>

$fn=100;

//Delete the comments so you can see how it all fits together:
translate([0,0,BallBearingInnerDiam()+1]){
	//CapTop(false);
}
translate([0,0,BallBearingInnerDiam()/2+1]){
	//BearingRecess();
}

module CapBottom(){

	difference(){
		cylinder(BallBearingHeight()/2+1,cupOD()/1.05,cupOD()/1.05);
		
		translate([0,0,BallBearingHeight()/2+1-(BallBearingHeight()-BallBearingInnerDiam()/2)]){
			cylinder(BallBearingHeight(),BallBearingDiam()/2,BallBearingDiam()/2);
		}	
		translate([0,0,-BallBearingInnerDiam()/8]){
			cylinder(BallBearingInnerDiam()/4+4,(BallBearingInnerDiam()+BallBearingDiam())/4,(BallBearingInnerDiam()+BallBearingDiam())/4);
		}
		translate([0,0,BallBearingHeight()/2+1.2]){
			CapTop(false);
		}
	}
}

CapBottom();
